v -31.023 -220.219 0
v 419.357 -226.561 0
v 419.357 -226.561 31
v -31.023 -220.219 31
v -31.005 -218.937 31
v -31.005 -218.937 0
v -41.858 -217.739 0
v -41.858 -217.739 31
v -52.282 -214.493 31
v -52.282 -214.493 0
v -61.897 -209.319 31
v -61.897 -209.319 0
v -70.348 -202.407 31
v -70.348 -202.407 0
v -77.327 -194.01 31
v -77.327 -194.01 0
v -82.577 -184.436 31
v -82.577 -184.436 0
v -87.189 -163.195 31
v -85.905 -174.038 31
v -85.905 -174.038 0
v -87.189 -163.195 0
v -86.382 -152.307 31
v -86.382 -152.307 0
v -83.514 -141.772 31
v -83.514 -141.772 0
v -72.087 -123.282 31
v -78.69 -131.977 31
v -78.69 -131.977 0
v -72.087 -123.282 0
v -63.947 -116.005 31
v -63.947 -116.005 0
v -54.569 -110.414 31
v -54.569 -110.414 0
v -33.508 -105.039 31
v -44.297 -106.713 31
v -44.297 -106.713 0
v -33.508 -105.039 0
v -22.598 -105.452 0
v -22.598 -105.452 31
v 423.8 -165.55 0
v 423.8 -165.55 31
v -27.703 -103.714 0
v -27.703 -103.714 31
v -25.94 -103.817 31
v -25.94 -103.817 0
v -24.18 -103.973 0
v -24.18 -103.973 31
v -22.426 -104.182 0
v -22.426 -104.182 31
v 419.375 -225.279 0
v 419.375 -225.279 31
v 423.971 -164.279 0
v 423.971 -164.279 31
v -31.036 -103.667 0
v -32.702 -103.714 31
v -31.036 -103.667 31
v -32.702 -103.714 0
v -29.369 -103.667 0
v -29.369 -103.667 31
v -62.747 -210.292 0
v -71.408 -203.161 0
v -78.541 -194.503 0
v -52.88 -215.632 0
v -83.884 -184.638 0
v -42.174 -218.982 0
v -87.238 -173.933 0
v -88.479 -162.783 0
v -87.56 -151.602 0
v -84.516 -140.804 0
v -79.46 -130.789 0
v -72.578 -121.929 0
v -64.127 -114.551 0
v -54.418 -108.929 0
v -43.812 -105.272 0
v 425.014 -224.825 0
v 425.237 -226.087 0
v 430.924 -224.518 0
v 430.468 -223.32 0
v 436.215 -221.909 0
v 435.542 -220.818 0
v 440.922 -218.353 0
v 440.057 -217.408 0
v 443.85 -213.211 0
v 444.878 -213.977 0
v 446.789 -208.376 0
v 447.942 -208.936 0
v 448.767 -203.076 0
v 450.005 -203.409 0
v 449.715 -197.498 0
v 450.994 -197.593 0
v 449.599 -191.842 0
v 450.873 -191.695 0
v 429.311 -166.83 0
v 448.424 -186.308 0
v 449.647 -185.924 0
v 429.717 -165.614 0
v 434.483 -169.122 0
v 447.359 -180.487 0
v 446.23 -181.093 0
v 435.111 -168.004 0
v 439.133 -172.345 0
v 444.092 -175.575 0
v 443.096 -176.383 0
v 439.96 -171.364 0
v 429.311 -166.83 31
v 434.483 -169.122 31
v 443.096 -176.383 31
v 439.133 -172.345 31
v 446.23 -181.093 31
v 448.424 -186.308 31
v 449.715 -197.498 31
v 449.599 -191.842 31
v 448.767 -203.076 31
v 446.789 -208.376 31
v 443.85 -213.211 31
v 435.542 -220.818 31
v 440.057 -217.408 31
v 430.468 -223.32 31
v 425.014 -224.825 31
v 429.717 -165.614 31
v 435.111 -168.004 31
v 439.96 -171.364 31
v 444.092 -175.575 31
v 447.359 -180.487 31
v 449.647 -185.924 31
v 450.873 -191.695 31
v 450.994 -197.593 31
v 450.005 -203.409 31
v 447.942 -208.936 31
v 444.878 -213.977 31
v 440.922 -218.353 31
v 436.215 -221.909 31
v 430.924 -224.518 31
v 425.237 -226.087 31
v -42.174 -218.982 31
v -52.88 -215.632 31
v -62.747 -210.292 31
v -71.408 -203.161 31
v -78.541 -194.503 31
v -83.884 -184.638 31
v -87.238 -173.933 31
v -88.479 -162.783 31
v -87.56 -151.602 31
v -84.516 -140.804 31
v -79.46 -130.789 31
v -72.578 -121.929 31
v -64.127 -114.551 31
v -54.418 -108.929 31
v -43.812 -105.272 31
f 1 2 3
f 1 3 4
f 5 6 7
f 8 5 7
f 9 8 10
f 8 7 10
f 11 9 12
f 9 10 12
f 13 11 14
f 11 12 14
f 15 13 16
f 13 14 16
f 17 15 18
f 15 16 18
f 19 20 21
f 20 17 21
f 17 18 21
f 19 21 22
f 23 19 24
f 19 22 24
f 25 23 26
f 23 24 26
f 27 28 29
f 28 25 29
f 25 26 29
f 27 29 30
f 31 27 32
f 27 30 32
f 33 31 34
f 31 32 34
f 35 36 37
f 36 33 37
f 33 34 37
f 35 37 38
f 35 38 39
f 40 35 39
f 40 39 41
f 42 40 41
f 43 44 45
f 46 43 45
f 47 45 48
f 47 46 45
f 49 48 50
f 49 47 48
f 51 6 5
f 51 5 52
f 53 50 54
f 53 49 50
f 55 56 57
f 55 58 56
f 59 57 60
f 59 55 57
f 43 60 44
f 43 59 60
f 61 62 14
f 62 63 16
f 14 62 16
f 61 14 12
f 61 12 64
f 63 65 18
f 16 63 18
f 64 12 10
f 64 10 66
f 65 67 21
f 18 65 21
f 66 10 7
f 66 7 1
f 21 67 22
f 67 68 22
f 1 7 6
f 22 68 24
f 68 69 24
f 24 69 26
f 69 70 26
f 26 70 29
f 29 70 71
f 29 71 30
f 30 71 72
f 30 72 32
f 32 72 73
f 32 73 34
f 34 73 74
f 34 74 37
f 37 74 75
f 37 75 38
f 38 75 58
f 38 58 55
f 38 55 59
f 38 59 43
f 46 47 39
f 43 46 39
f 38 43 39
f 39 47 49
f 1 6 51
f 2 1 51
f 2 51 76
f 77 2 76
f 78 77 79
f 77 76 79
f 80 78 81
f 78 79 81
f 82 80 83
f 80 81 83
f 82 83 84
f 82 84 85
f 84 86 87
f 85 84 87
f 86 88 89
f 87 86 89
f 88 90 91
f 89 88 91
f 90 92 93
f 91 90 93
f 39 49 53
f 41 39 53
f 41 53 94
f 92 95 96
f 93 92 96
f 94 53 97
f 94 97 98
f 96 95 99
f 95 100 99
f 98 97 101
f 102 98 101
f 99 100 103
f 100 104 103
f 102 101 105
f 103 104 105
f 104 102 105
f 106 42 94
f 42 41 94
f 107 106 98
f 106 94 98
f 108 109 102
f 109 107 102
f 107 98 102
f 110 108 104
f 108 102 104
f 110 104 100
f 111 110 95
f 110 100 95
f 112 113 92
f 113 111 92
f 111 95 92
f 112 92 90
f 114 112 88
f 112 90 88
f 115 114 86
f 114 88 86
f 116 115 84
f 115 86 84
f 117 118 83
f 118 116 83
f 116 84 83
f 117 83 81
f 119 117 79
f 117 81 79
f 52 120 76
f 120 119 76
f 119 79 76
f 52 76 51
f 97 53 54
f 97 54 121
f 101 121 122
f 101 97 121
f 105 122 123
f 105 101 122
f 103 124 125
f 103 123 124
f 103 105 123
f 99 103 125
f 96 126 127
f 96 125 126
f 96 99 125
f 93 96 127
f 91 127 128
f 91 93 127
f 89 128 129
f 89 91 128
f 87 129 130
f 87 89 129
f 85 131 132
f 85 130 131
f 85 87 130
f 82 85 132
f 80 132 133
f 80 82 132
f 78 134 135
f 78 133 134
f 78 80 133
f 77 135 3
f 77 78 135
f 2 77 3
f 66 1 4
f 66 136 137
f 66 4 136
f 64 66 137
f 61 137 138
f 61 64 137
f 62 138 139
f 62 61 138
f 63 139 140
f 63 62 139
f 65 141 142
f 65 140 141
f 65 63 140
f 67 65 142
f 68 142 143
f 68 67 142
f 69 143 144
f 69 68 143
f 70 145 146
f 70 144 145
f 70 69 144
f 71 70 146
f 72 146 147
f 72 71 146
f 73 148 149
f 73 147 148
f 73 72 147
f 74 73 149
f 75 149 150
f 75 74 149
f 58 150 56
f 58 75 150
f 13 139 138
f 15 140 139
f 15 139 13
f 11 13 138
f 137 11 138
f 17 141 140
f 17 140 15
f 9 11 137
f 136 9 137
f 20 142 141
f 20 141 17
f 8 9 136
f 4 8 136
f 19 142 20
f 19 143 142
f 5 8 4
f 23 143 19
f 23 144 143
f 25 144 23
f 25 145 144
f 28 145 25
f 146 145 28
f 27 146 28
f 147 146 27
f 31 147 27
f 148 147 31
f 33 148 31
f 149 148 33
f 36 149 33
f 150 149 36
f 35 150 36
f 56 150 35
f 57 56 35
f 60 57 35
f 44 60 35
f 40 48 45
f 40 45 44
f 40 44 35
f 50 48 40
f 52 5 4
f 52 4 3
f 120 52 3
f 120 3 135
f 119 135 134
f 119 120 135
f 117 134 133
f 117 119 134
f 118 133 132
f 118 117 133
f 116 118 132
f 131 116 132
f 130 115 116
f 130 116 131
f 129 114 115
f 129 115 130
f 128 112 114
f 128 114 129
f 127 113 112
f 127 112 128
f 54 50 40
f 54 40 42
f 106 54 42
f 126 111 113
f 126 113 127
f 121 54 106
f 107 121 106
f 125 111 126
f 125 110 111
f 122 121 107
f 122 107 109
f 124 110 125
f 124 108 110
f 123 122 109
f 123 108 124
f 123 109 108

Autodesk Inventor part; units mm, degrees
ref_plane "YZ Plane" through (0, 0, 0) normal (1, 0, 0) x (0, 1, 0)
ref_plane "XZ Plane" through (0, 0, 0) normal (0, 1, 0) x (-1, 0, 0)
ref_plane "XY Plane" through (0, 0, 0) normal (0, 0, 1) x (1, 0, 0)
sketch "Sketch1" plane through (0, 0, 0) normal (0, 0, 1) x (1, 0, 0)
  arc A0 (-22.5975, -105.4525) -> (-31.0052, -218.9372) centre (-30.2027, -161.9428) ccw
  arc A1 (419.3749, -225.2787) -> (423.8, -165.5499) centre (419.7973, -195.2817) ccw
  line L0 (-22.5975, -105.4525) -> (423.8, -165.5499)
  line L1 (-31.0052, -218.9372) -> (419.3749, -225.2787)
  arc A2 (-22.4265, -104.1818) -> (-31.0232, -220.2191) centre (-30.2027, -161.9428) ccw
  line L2 (-22.4265, -104.1818) -> (423.9711, -164.2793)
  arc A3 (419.3569, -226.5607) -> (423.9711, -164.2793) centre (419.7973, -195.2817) ccw
  line L3 (419.3569, -226.5607) -> (-31.0232, -220.2191)
  arc A4 (-27.7033, -103.7144) -> (-32.7021, -103.7144) centre (-30.2027, -103.6607) ccw
  point P0 (0, 0)
  dimension "d1" = 57
  dimension "d2" = 30
  dimension "d3" = 450
  dimension "d4" = 1.2821
  dimension "d7" = 5
extrude "Extrusion1" add sketch "Sketch1" along normal blind 31 contours L2 A3 L3 A2
sketch "Sketch2" plane through (0, 0, 0) normal (0, 0, -1) x (-1, 0, 0)
  point P0 (0, 0)
extrude "Extrusion3" [suppressed]
equation "\"d1\" = 0.5 * NagyKerekAtmero"
equation "\"d2\" = 0.5 * KisKerekAtmero"
equation "\"d5\" = SzíjSzélességA"
equation "\"NagyKerekAtmero\" = 114"
equation "\"KisKerekAtmero\" = 60"
equation "\"SzíjSzélességA\" = 31"
properties part number "Szij"
